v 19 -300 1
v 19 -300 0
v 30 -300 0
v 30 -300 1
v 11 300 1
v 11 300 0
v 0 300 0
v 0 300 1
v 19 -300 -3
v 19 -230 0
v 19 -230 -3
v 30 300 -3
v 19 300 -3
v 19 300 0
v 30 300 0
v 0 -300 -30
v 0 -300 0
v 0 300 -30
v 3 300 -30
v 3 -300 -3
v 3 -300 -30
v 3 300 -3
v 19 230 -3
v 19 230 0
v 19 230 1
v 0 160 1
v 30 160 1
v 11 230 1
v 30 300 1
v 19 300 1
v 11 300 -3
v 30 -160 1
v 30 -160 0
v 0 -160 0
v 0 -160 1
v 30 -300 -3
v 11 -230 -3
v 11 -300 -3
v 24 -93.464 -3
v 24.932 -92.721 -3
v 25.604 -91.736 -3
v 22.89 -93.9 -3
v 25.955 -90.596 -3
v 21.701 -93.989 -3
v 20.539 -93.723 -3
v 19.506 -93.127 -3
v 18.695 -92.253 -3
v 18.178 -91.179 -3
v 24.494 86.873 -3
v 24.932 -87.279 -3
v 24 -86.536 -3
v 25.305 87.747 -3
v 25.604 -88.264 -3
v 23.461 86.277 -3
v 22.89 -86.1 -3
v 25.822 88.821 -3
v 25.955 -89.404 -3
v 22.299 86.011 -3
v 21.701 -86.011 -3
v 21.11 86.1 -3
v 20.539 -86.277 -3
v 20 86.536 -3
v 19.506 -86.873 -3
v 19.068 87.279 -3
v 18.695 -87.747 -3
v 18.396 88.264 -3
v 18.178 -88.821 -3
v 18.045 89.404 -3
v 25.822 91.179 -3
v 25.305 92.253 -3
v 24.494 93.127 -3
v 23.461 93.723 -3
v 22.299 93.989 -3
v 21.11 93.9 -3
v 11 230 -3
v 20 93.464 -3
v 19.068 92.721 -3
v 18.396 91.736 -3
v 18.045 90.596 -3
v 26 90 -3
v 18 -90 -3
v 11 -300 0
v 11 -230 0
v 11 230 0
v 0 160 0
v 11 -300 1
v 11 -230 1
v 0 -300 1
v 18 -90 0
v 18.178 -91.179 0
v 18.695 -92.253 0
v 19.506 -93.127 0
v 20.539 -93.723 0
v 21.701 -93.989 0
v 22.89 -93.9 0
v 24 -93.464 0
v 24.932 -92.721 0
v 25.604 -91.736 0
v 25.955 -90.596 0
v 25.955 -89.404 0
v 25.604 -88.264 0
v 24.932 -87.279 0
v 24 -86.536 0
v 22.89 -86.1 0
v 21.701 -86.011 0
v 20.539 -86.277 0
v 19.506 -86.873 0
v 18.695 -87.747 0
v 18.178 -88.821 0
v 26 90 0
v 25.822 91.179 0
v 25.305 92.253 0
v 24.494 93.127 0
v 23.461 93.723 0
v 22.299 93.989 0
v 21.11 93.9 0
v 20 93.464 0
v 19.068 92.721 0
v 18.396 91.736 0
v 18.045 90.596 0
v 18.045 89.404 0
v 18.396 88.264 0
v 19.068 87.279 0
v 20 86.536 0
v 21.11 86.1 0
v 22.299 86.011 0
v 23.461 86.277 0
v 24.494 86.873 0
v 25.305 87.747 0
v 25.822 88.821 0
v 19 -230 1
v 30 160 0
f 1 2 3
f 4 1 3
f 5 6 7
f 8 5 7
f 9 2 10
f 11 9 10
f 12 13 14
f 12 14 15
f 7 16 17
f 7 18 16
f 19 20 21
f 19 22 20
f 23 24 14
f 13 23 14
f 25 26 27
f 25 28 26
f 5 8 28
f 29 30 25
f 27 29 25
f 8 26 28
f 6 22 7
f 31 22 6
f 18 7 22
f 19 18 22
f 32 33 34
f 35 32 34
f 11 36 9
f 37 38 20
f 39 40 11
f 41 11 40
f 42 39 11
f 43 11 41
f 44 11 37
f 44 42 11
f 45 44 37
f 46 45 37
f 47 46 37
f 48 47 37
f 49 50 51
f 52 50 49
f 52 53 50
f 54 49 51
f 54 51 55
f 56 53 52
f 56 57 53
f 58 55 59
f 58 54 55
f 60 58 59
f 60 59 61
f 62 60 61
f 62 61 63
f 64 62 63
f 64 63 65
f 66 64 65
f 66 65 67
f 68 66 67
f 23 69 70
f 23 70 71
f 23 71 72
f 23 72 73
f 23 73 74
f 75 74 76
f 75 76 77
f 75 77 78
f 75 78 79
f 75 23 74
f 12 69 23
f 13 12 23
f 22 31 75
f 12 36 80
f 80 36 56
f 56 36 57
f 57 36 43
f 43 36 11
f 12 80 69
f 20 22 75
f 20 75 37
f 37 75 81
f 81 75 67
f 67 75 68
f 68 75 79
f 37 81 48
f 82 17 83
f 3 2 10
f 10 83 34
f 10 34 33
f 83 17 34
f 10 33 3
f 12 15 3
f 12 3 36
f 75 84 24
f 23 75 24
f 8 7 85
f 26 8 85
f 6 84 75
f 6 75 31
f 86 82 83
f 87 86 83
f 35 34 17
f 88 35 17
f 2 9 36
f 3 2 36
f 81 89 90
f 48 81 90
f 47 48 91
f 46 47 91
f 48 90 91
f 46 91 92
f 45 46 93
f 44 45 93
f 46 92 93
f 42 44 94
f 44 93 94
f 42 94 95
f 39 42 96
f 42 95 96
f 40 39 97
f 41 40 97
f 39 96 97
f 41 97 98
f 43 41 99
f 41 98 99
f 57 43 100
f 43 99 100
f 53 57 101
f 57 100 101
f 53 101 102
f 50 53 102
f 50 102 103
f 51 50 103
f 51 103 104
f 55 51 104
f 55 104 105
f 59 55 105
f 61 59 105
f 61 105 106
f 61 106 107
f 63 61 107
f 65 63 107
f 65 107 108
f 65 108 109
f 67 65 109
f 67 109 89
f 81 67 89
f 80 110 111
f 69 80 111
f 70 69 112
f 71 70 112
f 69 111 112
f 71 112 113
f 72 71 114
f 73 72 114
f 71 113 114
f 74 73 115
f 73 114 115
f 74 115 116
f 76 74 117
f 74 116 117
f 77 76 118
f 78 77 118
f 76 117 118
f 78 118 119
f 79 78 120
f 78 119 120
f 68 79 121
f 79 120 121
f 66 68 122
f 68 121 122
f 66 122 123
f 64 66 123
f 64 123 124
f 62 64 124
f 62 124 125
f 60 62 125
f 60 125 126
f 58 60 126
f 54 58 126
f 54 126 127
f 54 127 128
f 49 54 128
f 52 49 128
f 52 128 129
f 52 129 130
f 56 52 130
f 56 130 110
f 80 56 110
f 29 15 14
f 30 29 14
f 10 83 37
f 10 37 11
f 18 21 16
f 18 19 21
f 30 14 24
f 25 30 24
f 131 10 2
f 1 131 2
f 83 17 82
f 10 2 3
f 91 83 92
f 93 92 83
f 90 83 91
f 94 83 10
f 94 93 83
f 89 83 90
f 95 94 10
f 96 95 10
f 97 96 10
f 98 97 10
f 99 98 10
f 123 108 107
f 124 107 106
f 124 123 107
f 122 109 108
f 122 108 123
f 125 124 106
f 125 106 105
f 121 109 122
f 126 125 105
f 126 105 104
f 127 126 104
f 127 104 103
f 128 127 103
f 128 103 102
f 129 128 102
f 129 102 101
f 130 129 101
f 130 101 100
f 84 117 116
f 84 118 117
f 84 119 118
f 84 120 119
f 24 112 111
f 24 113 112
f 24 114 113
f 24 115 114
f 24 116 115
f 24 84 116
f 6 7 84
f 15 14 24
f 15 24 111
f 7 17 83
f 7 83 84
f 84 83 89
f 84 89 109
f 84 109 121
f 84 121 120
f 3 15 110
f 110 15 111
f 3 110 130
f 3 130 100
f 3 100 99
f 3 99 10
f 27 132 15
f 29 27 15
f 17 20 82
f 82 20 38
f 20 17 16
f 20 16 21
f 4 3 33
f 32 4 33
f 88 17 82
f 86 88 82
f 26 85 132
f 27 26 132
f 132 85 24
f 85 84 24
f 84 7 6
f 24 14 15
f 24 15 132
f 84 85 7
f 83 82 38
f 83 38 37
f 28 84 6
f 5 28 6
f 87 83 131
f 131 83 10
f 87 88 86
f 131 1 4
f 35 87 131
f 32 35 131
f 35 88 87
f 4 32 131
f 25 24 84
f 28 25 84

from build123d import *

# Parameters (mm, degrees)
EXTRU_MINCE1_DEPTH      = 300
ESQUISSE2_R             = 4
ESQUISSE2_W             = 8
ESQUISSE2_H             = 70
ENL_V_MAT_EXTRU_1_DEPTH = 303.985148151
BOSS_EXTRU_1_DEPTH      = 1
BOSS_EXTRU_1_2_DEPTH    = 1


with BuildPart() as part:
    # Esquisse1 → Extru.-Mince1 (new, symmetric)
    with BuildSketch(Plane(origin=(0, 0, 0), x_dir=(1, 0, 0), z_dir=(0, 1, 0))):
        Polygon((0, 30), (0, 0), (30, 0), (30, 3), (3, 3), (3, 30), align=None)
    extrude(amount=EXTRU_MINCE1_DEPTH, both=True)

    # Esquisse2 → Enlèv. mat.-Extru.1 (cut, through all)
    with BuildSketch(Plane.XY):
        with Locations((22, 90)):
            Circle(ESQUISSE2_R)
        with Locations(Location((22, -90, 0), (0, 0, 180))):
            Circle(ESQUISSE2_R)
        with Locations((15, 265)):
            Rectangle(ESQUISSE2_W, ESQUISSE2_H)
        with Locations((15, -265)):
            Rectangle(ESQUISSE2_W, ESQUISSE2_H)
    extrude(amount=-ENL_V_MAT_EXTRU_1_DEPTH, mode=Mode.SUBTRACT)


with BuildPart() as body_2:
    # Esquisse3 → Boss.-Extru.1 (new body)
    with BuildSketch(Plane.XY):
        Polygon((0, 160), (30, 160), (30, 300), (19, 300), (19, 230), (11, 230), (11, 300), (0, 300), align=None)
    extrude(amount=BOSS_EXTRU_1_DEPTH)


with BuildPart() as body_3:
    # Esquisse3 → Boss.-Extru.1 2 (new body)
    with BuildSketch(Plane.XY):
        Polygon((0, -160), (0, -300), (11, -300), (11, -230), (19, -230), (19, -300), (30, -300), (30, -160), align=None)
    extrude(amount=BOSS_EXTRU_1_2_DEPTH)


solid = Compound([part.part, body_2.part, body_3.part])
